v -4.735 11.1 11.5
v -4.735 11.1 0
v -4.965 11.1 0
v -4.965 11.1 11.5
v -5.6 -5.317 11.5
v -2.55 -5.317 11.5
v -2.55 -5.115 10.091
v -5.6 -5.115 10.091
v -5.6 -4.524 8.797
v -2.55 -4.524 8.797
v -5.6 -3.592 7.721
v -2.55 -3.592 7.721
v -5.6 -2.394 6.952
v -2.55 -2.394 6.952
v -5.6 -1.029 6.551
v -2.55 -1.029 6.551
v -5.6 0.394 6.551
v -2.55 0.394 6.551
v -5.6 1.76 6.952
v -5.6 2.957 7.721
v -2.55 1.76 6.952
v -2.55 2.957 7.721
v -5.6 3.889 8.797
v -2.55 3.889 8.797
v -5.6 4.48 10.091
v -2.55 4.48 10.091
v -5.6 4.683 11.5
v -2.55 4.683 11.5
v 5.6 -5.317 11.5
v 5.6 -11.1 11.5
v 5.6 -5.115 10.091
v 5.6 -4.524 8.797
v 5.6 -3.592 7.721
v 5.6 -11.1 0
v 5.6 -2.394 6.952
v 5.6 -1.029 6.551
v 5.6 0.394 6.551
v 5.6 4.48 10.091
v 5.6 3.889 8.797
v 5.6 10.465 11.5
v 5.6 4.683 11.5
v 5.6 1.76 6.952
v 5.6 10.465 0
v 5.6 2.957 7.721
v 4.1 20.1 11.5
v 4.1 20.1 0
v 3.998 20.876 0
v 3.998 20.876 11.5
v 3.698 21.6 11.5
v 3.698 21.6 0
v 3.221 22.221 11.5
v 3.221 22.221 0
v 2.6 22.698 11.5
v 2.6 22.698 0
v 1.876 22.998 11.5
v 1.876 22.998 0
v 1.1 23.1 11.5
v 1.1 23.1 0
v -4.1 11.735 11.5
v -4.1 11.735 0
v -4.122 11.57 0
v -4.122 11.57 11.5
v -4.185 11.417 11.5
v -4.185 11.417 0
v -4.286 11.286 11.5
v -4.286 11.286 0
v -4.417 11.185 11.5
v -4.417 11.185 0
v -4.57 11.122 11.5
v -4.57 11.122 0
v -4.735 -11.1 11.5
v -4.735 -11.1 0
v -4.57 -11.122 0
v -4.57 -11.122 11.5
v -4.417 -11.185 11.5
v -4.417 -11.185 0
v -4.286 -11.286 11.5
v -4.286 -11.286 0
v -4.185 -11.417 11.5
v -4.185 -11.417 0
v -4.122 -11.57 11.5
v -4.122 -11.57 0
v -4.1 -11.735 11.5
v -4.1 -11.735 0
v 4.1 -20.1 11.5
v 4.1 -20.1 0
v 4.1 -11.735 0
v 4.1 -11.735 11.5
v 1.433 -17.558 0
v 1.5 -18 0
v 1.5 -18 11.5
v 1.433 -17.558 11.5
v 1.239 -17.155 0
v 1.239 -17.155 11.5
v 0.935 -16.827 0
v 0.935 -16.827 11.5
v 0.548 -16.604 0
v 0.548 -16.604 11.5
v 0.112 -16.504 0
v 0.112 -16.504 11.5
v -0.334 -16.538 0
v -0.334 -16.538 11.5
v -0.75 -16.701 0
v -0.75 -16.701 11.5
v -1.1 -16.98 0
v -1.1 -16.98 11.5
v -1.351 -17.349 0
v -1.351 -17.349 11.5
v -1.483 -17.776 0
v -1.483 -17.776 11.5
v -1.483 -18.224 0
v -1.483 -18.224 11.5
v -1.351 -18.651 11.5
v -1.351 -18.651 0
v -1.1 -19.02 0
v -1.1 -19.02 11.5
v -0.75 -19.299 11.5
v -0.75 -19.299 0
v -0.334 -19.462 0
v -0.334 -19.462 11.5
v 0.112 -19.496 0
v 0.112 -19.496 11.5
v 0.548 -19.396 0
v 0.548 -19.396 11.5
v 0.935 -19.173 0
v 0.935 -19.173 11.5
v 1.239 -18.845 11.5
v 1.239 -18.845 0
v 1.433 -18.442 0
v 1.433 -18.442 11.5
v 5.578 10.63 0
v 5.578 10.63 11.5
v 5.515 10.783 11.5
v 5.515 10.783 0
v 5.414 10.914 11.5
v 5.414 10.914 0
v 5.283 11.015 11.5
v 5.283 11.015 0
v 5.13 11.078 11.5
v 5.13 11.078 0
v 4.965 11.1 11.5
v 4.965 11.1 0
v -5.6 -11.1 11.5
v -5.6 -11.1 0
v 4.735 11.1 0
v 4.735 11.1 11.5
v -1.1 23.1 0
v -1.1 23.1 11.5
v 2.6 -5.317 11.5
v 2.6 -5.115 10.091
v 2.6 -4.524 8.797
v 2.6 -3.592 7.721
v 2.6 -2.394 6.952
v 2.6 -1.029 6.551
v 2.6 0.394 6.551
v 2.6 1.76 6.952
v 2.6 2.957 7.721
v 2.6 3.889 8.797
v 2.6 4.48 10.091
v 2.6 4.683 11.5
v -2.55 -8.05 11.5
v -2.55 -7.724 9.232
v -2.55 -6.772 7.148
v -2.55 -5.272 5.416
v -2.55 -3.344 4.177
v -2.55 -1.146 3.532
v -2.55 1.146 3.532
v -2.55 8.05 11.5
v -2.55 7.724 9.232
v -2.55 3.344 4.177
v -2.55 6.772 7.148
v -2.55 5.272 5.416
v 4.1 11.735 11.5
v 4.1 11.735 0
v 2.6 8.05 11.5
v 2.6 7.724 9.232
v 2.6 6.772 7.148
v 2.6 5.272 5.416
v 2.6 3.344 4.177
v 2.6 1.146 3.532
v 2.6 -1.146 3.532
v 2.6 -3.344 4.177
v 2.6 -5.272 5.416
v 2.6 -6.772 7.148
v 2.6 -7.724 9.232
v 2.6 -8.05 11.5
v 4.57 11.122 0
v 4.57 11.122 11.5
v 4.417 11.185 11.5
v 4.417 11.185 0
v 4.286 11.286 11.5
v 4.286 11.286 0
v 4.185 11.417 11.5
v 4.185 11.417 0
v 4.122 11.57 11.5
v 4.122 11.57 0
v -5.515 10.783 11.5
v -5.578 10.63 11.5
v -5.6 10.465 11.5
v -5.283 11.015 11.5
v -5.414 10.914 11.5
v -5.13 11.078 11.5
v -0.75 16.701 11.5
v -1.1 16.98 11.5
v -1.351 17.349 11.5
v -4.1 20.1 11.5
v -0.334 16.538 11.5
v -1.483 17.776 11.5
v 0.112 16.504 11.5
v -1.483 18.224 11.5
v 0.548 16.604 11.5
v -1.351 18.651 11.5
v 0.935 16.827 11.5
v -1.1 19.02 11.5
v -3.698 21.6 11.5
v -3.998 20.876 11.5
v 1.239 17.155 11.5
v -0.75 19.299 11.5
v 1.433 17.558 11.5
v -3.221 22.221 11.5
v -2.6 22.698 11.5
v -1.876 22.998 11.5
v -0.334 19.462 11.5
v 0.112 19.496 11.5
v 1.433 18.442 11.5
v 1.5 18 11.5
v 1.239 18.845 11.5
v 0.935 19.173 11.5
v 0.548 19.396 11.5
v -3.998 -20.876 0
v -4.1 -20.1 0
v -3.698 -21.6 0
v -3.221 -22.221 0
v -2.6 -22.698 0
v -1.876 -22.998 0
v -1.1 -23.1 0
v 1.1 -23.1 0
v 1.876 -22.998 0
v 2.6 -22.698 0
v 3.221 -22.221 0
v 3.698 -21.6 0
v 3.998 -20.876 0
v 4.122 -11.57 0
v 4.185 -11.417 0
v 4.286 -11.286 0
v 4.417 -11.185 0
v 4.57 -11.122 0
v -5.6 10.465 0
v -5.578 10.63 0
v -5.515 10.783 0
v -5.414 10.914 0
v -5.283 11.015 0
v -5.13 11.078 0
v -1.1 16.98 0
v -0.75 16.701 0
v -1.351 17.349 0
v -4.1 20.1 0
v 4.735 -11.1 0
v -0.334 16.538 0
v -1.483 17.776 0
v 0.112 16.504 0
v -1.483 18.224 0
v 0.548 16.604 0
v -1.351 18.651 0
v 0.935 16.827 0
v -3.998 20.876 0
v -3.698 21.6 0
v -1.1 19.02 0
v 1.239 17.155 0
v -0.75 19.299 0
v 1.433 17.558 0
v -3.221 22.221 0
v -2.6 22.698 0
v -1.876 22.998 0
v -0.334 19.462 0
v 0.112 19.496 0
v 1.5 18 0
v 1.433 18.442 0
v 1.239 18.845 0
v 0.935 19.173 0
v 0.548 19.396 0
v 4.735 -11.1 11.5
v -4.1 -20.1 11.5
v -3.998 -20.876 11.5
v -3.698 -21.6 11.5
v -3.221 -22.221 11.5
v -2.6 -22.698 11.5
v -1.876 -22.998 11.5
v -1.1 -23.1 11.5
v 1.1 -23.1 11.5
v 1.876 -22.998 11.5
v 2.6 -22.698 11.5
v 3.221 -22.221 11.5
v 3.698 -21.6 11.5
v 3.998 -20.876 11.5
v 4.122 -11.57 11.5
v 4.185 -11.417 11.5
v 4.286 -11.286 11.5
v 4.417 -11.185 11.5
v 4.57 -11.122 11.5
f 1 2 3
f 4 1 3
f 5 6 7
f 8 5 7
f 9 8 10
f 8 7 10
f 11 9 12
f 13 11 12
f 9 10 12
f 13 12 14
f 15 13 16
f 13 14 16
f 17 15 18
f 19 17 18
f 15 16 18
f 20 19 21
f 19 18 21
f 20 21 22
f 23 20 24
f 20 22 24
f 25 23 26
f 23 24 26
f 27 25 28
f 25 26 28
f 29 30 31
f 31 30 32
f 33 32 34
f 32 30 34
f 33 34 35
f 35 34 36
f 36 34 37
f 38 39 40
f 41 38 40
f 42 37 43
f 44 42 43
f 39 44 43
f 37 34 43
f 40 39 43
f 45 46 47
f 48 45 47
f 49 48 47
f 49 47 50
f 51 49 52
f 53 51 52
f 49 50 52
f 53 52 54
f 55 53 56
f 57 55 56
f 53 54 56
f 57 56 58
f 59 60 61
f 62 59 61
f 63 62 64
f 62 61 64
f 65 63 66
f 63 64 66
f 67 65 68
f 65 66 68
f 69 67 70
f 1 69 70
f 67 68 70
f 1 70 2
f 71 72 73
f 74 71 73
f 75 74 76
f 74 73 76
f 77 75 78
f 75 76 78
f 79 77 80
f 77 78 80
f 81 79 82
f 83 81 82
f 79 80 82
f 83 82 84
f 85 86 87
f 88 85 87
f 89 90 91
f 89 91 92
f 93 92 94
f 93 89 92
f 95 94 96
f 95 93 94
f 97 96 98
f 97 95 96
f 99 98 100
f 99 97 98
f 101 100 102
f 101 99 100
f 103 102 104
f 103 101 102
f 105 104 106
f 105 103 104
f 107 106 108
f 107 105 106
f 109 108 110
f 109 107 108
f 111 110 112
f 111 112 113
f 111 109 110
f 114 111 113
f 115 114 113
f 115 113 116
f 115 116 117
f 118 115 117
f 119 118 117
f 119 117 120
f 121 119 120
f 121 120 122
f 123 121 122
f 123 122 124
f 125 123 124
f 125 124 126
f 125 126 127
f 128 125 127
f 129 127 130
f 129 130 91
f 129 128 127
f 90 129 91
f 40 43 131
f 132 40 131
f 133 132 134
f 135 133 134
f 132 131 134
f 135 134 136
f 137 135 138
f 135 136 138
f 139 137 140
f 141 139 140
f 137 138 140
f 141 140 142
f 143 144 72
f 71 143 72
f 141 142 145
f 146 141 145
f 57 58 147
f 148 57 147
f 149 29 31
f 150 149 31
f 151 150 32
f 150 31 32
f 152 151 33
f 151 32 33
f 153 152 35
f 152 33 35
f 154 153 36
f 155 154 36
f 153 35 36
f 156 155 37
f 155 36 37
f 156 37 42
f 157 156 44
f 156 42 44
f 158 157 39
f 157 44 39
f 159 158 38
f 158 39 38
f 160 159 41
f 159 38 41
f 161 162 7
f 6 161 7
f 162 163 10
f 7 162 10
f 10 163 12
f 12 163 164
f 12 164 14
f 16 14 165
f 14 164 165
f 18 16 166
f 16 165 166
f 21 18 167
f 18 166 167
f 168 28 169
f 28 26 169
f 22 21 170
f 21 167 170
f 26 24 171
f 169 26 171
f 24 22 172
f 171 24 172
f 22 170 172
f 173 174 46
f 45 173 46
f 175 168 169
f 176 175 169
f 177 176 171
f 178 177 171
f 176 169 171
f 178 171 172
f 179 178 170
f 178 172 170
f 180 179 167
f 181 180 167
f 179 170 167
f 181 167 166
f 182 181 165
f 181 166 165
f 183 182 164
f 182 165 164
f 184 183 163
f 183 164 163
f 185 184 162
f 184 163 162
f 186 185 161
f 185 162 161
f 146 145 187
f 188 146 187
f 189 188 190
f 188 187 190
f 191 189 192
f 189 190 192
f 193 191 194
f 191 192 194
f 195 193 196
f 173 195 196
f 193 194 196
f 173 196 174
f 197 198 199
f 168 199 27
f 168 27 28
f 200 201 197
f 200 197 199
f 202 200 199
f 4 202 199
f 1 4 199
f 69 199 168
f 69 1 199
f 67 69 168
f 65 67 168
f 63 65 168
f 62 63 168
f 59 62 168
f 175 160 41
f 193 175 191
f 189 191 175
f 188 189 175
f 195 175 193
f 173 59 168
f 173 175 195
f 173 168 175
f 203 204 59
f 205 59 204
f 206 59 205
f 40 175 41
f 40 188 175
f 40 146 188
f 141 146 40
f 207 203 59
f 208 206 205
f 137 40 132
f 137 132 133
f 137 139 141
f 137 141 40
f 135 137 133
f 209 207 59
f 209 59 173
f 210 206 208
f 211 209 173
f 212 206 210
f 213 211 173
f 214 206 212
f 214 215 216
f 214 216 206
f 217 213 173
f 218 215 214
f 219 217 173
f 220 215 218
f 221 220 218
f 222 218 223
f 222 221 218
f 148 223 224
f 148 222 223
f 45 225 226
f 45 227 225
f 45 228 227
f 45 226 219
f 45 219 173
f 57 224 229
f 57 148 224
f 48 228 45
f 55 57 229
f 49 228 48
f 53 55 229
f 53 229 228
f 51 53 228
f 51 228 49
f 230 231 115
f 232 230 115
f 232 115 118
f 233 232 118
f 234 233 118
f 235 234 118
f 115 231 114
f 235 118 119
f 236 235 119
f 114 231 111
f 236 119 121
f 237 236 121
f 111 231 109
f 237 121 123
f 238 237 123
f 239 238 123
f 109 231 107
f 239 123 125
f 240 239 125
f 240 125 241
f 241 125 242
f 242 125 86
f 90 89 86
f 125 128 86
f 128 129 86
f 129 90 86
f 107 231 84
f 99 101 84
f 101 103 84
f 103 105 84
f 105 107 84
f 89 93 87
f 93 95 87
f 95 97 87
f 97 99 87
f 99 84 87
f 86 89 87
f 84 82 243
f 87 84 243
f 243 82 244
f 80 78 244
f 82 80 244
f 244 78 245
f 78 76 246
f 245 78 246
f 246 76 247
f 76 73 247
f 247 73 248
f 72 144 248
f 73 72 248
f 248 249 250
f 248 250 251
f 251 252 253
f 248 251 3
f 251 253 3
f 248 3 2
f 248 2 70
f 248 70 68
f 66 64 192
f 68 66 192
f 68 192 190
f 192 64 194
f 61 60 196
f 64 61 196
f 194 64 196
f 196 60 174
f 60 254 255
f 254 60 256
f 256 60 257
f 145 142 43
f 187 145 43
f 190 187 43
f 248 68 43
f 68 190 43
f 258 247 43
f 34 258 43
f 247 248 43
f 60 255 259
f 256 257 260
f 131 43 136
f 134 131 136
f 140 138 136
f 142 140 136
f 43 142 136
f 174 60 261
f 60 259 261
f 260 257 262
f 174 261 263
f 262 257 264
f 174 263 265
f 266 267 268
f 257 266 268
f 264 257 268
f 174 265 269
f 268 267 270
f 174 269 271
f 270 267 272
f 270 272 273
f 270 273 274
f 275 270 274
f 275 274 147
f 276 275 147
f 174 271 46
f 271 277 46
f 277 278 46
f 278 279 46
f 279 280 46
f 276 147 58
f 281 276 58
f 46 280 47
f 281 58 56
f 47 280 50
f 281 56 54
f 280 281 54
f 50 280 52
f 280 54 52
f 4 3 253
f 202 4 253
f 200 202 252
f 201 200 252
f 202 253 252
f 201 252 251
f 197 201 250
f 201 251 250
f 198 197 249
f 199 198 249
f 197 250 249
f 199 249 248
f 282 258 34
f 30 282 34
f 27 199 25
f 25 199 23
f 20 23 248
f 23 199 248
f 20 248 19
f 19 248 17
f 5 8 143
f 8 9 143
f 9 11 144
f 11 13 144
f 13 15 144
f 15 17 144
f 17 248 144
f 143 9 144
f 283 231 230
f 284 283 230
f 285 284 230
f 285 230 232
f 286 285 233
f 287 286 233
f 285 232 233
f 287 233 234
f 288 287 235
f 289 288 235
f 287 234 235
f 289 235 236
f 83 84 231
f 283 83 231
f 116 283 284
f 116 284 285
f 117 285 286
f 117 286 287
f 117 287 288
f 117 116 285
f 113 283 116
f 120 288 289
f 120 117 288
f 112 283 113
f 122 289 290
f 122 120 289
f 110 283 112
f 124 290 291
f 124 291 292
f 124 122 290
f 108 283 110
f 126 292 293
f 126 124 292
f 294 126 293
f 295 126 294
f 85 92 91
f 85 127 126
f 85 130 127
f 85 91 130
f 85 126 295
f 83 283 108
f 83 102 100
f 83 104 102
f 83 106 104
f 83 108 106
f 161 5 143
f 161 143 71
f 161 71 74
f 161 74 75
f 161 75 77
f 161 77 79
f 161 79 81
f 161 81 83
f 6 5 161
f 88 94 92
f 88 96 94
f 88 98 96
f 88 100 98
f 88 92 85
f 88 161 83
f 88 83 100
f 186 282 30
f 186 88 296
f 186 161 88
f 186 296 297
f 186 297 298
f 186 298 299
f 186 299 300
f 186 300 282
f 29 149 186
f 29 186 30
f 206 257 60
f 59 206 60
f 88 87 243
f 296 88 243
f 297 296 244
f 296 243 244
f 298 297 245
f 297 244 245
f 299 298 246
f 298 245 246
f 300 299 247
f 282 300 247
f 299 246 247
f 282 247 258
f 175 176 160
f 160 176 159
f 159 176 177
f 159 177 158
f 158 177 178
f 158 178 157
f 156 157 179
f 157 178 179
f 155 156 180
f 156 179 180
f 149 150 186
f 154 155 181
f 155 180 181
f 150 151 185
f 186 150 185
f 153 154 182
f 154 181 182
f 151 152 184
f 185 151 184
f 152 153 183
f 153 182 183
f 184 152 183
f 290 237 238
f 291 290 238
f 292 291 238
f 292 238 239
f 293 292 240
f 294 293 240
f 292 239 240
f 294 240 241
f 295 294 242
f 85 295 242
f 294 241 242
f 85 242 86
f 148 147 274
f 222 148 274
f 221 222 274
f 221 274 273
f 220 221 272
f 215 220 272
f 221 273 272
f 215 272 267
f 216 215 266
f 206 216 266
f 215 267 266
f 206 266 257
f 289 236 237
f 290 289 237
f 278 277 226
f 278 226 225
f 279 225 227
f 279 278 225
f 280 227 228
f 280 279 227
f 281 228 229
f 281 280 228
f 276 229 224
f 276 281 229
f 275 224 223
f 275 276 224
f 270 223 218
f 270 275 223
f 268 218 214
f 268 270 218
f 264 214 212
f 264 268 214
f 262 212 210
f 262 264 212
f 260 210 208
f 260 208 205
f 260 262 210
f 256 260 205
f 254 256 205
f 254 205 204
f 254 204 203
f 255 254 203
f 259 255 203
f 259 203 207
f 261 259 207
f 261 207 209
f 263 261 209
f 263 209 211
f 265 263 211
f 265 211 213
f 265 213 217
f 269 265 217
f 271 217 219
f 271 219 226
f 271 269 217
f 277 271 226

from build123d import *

# Parameters (mm, degrees)
F0_R     = 1.5
F0_W     = 5.1
F0_H     = 16.1
F1_DEPTH = 11.5
F3_DEPTH = 25


# Not quite as in the source:
# - a feature names something its author has since deleted; it is built from what else it names


with BuildPart() as f1:
    # F0 (on Top) → F1 (new body)
    with BuildSketch(Plane.XY):
        with BuildLine():
            ThreePointArc((5.5999997705, 10.465261464), (5.4140892248, 10.9140892248), (4.965261464, 11.0999997705))
            Line((4.965261464, 11.0999997705), (4.734738077, 11.0999997705))
            Line((4.734738077, 11.0999997705), (-4.734738077, 11.0999997705))
            Line((-4.734738077, 11.0999997705), (-4.965261464, 11.0999997705))
            ThreePointArc((-4.965261464, 11.0999997705), (-5.4140892248, 10.9140892248), (-5.5999997705, 10.465261464))
            Line((-5.5999997705, 10.465261464), (-5.5999997705, -10.465261464))
            ThreePointArc((-5.5999997705, -10.465261464), (-5.4140892248, -10.9140892248), (-4.965261464, -11.0999997705))
            Line((-4.965261464, -11.0999997705), (-4.734738077, -11.0999997705))
            Line((-4.734738077, -11.0999997705), (4.734738077, -11.0999997705))
            Line((4.734738077, -11.0999997705), (4.965261464, -11.0999997705))
            ThreePointArc((4.965261464, -11.0999997705), (5.4140892248, -10.9140892248), (5.5999997705, -10.465261464))
            Line((5.5999997705, -10.465261464), (5.5999997705, 10.465261464))
        make_face()
        Polygon((2.6, 8.1), (2.6, 0), (2.6, -8.1), (-2.6, -8.1), (-2.6, 8.1), align=None, mode=Mode.SUBTRACT)
        with BuildLine():
            Line((-4.734738077, 11.0999997705), (4.734738077, 11.0999997705))
            ThreePointArc((4.734738077, 11.0999997705), (4.2859103162, 11.2859103162), (4.0999997705, 11.734738077))
            Line((4.0999997705, 11.734738077), (4.0999997705, 20.0999997705))
            ThreePointArc((4.0999997705, 20.0999997705), (3.2213201141, 22.2213201141), (1.0999997705, 23.0999997705))
            Line((1.0999997705, 23.0999997705), (-1.0999997705, 23.0999997705))
            ThreePointArc((-1.0999997705, 23.0999997705), (-3.2213201141, 22.2213201141), (-4.0999997705, 20.0999997705))
            Line((-4.0999997705, 20.0999997705), (-4.0999997705, 11.734738077))
            ThreePointArc((-4.0999997705, 11.734738077), (-4.2859103162, 11.2859103162), (-4.734738077, 11.0999997705))
        make_face()
        with Locations((0, 18)):
            Circle(F0_R, mode=Mode.SUBTRACT)
        with BuildLine():
            ThreePointArc((4.0999997705, -11.734738077), (4.2859103162, -11.2859103162), (4.734738077, -11.0999997705))
            Line((4.734738077, -11.0999997705), (-4.734738077, -11.0999997705))
            ThreePointArc((-4.734738077, -11.0999997705), (-4.2859103162, -11.2859103162), (-4.0999997705, -11.734738077))
            Line((-4.0999997705, -11.734738077), (-4.0999997705, -20.0999997705))
            ThreePointArc((-4.0999997705, -20.0999997705), (-3.2213201141, -22.2213201141), (-1.0999997705, -23.0999997705))
            Line((-1.0999997705, -23.0999997705), (1.0999997705, -23.0999997705))
            ThreePointArc((1.0999997705, -23.0999997705), (3.2213201141, -22.2213201141), (4.0999997705, -20.0999997705))
            Line((4.0999997705, -20.0999997705), (4.0999997705, -11.734738077))
        make_face()
        with Locations((0, -18)):
            Circle(F0_R, mode=Mode.SUBTRACT)
        Polygon((2.6, -8.1), (2.6, 0), (2.6, 8.1), (-2.6, 8.1), (-2.6, -8.1), align=None)
        Rectangle(F0_W, F0_H, mode=Mode.SUBTRACT)
        Rectangle(F0_W, F0_H)
        with BuildLine():
            Line((5.5999997705, -11.0999997705), (5.5999997705, -10.465261464))
            ThreePointArc((5.5999997705, -10.465261464), (5.4140892248, -10.9140892248), (4.965261464, -11.0999997705))
            Line((4.965261464, -11.0999997705), (5.5999997705, -11.0999997705))
        make_face()
        with BuildLine():
            ThreePointArc((-4.965261464, -11.0999997705), (-5.4140892248, -10.9140892248), (-5.5999997705, -10.465261464))
            Line((-5.5999997705, -10.465261464), (-5.5999997705, -11.0999997705))
            Line((-5.5999997705, -11.0999997705), (-4.965261464, -11.0999997705))
        make_face()
    extrude(amount=F1_DEPTH)

    # F2 (on face) → F3 (cut)
    with BuildSketch(Plane.YZ.offset(5.5999997705)):
        with BuildLine():
            ThreePointArc((-5.3173691533, 11.5), (-0.3173691533, 6.5), (4.6826308467, 11.5))
            Line((4.6826308467, 11.5), (-5.3173691533, 11.5))
        make_face()
    extrude(amount=-F3_DEPTH, mode=Mode.SUBTRACT)

    # F4 (on face) → F5 (revolve, cut)
    with BuildSketch(Plane.XY.offset(11.5)):
        Polygon((2.55, 8.05), (-2.55, 8.05), (-2.55, 4.6826308467), (2.6, 4.6826308467), (2.6, 8.05), align=None)
        Polygon((2.6, 4.6826308467), (-2.55, 4.6826308467), (-2.55, 0), (0, 0), (2.6, 0), align=None)
    revolve(axis=Axis((0.025, 0, 11.5), (-1, 0, 0)), mode=Mode.SUBTRACT)


solid = f1.part
